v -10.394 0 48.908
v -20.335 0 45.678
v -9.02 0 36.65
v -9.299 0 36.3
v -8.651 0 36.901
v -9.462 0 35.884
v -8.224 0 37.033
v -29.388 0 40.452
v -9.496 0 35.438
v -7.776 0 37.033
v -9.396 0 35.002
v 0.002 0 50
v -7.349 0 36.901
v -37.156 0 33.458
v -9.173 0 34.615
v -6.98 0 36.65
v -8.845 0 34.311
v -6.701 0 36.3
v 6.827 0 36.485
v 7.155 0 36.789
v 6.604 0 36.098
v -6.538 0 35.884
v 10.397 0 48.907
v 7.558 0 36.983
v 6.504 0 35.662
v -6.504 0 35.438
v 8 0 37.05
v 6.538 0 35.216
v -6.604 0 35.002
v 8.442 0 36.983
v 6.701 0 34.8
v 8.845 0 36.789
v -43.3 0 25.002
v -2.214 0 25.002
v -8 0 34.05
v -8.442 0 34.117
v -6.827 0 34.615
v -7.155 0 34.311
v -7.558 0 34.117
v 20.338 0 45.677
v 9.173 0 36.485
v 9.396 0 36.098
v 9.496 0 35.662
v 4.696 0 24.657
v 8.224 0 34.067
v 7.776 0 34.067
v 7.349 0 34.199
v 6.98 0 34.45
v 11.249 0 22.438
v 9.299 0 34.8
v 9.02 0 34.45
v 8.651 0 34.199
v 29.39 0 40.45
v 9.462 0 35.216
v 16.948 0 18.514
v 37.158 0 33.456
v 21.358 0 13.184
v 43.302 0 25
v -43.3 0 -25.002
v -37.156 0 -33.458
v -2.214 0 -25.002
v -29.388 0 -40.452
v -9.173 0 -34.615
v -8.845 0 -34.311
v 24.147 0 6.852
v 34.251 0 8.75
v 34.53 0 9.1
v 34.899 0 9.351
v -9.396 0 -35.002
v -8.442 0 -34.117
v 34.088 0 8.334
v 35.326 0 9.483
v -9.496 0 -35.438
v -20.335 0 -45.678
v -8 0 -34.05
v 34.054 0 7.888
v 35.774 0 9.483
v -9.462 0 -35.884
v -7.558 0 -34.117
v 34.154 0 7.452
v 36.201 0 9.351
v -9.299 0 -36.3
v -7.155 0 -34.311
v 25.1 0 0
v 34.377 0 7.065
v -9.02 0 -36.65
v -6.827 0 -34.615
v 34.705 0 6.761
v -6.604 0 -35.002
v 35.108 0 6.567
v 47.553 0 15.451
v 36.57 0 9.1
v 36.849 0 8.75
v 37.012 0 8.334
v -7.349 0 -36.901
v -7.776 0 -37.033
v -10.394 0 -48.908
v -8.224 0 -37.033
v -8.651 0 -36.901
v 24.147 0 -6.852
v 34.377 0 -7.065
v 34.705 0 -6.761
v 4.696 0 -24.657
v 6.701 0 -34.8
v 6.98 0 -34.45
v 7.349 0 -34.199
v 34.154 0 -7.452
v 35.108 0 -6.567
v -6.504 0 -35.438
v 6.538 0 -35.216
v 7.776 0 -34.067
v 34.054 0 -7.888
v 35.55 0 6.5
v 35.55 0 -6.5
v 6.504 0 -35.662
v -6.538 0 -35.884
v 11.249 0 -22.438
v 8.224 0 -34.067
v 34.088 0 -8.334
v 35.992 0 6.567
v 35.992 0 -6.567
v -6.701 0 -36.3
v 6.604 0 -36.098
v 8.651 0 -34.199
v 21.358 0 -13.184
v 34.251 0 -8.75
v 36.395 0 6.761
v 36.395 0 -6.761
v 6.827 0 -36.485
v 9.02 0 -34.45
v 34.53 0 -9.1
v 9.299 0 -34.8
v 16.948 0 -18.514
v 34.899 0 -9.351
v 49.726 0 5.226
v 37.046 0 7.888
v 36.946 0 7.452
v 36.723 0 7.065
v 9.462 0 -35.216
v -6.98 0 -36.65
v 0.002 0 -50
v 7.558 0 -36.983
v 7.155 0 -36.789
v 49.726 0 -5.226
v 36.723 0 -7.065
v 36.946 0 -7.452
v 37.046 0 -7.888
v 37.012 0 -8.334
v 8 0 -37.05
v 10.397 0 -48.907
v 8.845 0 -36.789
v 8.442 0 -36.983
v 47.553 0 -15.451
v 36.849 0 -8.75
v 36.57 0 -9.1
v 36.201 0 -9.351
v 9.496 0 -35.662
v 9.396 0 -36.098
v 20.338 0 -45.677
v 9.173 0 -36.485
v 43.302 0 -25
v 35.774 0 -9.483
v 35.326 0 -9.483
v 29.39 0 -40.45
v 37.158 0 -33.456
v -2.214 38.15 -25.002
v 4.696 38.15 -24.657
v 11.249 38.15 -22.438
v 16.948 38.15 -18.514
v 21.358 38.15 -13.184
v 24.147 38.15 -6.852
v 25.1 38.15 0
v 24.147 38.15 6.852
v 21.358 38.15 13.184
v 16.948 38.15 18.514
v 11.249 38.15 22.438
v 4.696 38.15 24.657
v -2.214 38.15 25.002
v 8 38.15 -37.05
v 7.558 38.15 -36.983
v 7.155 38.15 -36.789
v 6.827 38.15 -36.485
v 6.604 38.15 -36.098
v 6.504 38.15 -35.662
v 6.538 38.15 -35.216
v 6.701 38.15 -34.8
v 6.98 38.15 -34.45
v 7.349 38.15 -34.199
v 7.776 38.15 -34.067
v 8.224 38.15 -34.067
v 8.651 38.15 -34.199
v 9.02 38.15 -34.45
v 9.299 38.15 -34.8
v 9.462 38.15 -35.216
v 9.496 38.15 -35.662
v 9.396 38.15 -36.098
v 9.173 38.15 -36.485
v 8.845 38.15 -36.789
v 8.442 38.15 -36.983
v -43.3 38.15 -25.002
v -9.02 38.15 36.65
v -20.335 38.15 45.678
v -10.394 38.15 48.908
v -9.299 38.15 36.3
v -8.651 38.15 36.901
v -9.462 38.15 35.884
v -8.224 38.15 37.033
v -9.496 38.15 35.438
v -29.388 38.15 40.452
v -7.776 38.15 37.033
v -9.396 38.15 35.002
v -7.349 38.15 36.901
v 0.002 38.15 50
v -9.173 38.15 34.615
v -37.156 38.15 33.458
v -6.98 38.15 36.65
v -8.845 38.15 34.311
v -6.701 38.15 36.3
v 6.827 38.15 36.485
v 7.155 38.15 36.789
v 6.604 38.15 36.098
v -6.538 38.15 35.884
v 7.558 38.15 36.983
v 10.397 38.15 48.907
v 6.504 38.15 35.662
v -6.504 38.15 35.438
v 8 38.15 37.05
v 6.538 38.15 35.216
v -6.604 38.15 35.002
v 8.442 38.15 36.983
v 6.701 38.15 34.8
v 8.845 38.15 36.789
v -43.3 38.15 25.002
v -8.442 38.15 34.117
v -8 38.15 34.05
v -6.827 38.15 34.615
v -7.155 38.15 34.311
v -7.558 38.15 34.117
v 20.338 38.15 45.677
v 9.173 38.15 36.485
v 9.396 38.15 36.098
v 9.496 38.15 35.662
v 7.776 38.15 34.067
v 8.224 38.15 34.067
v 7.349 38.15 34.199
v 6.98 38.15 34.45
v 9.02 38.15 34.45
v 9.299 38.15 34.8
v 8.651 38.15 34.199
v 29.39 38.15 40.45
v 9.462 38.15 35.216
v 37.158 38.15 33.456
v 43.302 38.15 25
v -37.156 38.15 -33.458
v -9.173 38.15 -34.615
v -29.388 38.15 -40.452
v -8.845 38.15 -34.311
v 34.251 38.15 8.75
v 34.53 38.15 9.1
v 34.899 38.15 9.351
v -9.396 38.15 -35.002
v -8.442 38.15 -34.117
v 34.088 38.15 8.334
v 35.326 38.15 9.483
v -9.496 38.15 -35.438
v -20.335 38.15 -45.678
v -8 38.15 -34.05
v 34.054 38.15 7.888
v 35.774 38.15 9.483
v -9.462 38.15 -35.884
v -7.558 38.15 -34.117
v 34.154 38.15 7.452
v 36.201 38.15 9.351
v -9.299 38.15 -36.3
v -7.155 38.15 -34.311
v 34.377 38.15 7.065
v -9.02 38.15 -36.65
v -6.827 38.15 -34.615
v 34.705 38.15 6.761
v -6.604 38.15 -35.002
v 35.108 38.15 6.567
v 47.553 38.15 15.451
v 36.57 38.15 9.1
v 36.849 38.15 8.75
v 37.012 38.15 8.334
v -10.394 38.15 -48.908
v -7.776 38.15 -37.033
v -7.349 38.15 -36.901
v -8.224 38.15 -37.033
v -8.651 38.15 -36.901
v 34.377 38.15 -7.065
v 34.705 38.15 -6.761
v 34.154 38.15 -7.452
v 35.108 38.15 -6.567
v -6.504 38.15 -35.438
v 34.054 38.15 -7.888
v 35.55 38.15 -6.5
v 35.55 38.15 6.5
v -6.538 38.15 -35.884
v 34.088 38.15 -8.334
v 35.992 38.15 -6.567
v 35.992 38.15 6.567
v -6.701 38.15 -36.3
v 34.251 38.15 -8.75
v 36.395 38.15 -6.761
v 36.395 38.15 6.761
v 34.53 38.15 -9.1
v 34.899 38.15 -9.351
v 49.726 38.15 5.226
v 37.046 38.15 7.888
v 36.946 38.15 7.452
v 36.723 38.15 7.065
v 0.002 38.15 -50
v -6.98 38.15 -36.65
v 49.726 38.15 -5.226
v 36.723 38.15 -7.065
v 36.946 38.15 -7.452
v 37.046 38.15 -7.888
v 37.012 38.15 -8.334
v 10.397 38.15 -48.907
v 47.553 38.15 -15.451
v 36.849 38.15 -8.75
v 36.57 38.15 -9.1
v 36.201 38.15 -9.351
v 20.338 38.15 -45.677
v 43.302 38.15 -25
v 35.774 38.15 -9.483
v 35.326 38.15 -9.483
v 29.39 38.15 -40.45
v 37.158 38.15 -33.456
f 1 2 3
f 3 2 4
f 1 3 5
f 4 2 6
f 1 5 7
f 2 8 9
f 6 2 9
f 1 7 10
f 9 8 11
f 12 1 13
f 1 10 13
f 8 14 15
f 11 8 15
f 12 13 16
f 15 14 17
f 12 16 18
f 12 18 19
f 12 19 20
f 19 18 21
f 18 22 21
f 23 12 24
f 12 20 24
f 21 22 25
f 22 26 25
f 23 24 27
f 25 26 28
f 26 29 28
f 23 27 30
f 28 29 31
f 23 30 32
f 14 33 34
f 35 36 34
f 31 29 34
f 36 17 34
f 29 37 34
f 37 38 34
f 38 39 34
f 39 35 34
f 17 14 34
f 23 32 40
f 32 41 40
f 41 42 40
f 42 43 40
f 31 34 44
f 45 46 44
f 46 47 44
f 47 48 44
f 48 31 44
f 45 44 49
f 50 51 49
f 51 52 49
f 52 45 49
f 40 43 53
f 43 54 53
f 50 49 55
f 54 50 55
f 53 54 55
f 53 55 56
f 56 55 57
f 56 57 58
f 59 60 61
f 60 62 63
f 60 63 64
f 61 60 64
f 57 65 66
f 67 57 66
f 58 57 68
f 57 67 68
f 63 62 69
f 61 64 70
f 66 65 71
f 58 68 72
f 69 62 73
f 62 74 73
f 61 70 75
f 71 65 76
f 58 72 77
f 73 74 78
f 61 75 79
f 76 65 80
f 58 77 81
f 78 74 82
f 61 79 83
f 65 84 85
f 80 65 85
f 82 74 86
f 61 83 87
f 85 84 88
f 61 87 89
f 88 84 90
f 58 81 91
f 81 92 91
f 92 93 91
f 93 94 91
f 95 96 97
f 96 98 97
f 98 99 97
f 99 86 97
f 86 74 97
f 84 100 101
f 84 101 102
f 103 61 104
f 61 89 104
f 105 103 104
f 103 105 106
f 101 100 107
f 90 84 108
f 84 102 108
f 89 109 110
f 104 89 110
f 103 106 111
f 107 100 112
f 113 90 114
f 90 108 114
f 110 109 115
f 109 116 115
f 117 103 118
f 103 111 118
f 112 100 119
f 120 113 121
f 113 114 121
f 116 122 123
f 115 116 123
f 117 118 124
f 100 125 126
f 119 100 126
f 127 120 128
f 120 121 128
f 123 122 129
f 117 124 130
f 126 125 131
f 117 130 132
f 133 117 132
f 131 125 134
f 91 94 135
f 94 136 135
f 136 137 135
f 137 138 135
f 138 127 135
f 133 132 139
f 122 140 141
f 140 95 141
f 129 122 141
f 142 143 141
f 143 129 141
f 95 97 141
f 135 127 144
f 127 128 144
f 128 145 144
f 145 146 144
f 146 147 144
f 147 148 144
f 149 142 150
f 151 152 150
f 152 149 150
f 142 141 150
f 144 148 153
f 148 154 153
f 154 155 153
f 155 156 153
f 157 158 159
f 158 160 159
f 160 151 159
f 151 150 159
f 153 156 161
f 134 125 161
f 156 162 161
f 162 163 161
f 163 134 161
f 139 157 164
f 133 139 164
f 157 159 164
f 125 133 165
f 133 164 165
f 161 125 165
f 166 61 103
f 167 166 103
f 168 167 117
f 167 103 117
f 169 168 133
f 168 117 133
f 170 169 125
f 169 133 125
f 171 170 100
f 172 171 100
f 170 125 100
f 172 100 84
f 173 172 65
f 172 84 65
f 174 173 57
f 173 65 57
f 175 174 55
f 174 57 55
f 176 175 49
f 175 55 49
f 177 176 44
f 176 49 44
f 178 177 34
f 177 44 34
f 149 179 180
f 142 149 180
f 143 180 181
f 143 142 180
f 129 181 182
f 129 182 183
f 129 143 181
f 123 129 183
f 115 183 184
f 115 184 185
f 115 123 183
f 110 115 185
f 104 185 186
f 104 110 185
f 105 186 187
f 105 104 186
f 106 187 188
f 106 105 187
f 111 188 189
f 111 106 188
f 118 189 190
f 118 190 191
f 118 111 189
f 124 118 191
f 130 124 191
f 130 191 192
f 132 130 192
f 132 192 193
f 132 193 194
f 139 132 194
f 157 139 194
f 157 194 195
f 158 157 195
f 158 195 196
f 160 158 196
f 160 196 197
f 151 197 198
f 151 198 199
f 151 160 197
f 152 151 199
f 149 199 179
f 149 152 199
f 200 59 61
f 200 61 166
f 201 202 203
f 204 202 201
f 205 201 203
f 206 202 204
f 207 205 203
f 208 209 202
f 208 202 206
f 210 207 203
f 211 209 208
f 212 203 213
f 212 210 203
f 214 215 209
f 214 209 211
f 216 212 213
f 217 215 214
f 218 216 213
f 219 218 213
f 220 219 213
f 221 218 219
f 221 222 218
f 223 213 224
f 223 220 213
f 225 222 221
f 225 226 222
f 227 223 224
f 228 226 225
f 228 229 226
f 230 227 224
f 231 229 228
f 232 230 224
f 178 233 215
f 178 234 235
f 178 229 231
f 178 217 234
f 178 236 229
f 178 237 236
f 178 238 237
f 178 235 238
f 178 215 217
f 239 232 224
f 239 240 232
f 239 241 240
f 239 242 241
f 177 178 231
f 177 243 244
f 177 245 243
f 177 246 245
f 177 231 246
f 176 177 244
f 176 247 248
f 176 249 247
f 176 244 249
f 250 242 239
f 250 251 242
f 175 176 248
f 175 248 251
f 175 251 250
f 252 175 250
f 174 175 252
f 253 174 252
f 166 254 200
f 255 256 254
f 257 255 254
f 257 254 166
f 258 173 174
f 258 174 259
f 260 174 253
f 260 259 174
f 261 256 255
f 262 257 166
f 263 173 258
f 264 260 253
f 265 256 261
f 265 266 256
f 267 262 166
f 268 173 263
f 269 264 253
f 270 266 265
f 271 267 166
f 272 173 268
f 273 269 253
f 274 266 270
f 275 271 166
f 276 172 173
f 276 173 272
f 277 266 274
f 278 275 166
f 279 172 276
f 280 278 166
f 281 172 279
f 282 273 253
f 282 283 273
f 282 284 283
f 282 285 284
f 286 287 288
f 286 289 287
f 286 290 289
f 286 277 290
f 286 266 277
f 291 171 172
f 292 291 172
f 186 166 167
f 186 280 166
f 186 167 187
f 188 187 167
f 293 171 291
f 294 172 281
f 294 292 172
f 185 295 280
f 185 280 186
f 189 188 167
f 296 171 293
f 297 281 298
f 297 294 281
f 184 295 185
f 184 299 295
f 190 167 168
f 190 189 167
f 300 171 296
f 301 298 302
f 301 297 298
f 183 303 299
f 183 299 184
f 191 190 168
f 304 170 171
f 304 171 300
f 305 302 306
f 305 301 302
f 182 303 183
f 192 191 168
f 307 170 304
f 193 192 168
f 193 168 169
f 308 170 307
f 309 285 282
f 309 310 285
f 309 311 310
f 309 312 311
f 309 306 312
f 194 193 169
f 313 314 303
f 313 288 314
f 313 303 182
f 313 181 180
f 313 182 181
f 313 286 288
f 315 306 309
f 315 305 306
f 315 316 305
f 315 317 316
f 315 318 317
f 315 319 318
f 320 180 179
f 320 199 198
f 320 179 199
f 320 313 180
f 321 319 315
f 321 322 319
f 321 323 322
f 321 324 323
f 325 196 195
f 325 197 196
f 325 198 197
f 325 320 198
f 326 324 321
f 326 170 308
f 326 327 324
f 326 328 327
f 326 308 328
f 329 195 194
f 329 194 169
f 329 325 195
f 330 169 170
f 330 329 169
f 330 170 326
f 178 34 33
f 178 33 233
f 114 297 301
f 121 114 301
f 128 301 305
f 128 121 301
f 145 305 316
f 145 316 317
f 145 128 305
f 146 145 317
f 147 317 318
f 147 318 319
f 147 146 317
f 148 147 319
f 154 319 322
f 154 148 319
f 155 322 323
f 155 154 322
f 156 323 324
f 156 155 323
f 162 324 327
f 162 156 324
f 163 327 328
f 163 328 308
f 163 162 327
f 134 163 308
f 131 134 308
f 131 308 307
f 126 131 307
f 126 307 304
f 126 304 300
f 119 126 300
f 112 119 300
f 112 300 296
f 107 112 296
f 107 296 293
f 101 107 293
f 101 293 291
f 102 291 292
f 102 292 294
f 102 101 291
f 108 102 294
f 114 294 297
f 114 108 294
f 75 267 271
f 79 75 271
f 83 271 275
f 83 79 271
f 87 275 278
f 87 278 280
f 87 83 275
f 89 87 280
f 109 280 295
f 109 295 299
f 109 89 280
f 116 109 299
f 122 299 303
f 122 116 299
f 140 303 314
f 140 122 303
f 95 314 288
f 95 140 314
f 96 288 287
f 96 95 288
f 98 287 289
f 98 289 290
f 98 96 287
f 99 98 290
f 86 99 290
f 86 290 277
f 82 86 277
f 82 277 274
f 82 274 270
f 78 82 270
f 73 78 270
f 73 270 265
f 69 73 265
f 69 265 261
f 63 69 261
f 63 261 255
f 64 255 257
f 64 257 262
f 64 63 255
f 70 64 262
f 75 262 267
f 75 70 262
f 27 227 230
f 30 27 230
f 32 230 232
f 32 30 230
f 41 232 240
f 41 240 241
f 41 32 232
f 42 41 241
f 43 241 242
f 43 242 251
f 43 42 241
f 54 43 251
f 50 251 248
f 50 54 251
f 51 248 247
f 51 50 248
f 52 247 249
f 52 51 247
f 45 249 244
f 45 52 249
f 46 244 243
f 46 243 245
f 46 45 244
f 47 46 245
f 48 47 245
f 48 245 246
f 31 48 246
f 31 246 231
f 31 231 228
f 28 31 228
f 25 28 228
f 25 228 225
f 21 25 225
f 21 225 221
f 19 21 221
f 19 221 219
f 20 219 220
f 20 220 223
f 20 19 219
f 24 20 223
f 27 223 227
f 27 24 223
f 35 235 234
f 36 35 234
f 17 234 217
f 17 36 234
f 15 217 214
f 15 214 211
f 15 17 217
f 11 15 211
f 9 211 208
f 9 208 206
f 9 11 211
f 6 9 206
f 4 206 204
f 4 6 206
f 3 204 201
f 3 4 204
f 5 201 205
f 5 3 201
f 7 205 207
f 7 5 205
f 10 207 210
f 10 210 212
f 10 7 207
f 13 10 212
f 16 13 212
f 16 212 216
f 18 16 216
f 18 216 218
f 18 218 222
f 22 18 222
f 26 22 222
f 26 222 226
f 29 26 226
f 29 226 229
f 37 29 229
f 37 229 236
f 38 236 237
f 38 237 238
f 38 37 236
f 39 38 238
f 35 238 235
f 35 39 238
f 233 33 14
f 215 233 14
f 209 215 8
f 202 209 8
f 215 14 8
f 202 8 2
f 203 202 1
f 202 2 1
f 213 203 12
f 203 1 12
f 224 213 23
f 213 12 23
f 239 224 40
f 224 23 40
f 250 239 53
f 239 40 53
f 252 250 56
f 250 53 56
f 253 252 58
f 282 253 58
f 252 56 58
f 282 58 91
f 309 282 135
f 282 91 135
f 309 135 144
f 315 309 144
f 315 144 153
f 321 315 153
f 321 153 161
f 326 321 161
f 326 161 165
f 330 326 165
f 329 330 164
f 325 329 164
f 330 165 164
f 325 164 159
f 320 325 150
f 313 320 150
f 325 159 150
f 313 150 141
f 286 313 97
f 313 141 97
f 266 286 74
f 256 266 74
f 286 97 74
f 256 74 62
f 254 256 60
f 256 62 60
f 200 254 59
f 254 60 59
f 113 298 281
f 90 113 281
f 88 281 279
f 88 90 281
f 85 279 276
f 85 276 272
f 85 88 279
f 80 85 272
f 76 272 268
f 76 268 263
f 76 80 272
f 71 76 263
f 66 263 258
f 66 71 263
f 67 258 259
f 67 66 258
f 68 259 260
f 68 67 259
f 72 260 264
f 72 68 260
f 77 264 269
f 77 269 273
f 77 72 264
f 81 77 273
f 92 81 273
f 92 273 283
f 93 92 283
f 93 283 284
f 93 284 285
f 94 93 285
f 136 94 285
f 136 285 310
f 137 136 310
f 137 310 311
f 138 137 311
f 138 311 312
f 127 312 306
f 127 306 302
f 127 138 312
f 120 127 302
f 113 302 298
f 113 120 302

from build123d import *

# Parameters (mm, degrees)
SKETCH1_R           = 1.5
BOSS_EXTRUDE1_DEPTH = 38.15
SKETCH4_W           = 9.31
SKETCH4_H           = 38.15
CUT_EXTRUDE2_DEPTH  = 45


with BuildPart() as part:
    # Sketch1 → Boss-Extrude1 (new body)
    with BuildSketch(Plane(origin=(0, 0, 0), x_dir=(1, 0, 0), z_dir=(0, 1, 0))):
        with BuildLine():
            Line((-43.3, 25.002199903), (-19.589917361, 15.692199903))
            ThreePointArc((-19.589917361, 15.692199903), (25.1, 0), (-19.589917361, -15.692199903))
            Line((-19.589917361, -15.692199903), (-43.3, -25.002199903))
            ThreePointArc((-43.3, -25.002199903), (50, 0), (-43.3, 25.002199903))
        make_face()
        with Locations(Location((8, -35.55, 0), (0, 0, 270))):
            Circle(SKETCH1_R, mode=Mode.SUBTRACT)
        with Locations(Location((-8, -35.55, 0), (0, 0, 90))):
            Circle(SKETCH1_R, mode=Mode.SUBTRACT)
        with Locations(Location((8, 35.55, 0), (0, 0, 90))):
            Circle(SKETCH1_R, mode=Mode.SUBTRACT)
        with Locations(Location((-8, 35.55, 0), (0, 0, 270))):
            Circle(SKETCH1_R, mode=Mode.SUBTRACT)
        with Locations(Location((35.55, 8, 0), (0, 0, 270))):
            Circle(SKETCH1_R, mode=Mode.SUBTRACT)
        with Locations(Location((35.55, -8, 0), (0, 0, 90))):
            Circle(SKETCH1_R, mode=Mode.SUBTRACT)
    extrude(amount=BOSS_EXTRUDE1_DEPTH)

    # Sketch4 → Cut-Extrude2 (cut)
    with BuildSketch(Plane.ZY.offset(43.3)):
        with Locations((-20.347199903, 19.075)):
            Rectangle(SKETCH4_W, SKETCH4_H)
        with Locations((20.347199903, 19.075)):
            Rectangle(SKETCH4_W, SKETCH4_H)
    extrude(amount=-CUT_EXTRUDE2_DEPTH, mode=Mode.SUBTRACT)


solid = part.part
